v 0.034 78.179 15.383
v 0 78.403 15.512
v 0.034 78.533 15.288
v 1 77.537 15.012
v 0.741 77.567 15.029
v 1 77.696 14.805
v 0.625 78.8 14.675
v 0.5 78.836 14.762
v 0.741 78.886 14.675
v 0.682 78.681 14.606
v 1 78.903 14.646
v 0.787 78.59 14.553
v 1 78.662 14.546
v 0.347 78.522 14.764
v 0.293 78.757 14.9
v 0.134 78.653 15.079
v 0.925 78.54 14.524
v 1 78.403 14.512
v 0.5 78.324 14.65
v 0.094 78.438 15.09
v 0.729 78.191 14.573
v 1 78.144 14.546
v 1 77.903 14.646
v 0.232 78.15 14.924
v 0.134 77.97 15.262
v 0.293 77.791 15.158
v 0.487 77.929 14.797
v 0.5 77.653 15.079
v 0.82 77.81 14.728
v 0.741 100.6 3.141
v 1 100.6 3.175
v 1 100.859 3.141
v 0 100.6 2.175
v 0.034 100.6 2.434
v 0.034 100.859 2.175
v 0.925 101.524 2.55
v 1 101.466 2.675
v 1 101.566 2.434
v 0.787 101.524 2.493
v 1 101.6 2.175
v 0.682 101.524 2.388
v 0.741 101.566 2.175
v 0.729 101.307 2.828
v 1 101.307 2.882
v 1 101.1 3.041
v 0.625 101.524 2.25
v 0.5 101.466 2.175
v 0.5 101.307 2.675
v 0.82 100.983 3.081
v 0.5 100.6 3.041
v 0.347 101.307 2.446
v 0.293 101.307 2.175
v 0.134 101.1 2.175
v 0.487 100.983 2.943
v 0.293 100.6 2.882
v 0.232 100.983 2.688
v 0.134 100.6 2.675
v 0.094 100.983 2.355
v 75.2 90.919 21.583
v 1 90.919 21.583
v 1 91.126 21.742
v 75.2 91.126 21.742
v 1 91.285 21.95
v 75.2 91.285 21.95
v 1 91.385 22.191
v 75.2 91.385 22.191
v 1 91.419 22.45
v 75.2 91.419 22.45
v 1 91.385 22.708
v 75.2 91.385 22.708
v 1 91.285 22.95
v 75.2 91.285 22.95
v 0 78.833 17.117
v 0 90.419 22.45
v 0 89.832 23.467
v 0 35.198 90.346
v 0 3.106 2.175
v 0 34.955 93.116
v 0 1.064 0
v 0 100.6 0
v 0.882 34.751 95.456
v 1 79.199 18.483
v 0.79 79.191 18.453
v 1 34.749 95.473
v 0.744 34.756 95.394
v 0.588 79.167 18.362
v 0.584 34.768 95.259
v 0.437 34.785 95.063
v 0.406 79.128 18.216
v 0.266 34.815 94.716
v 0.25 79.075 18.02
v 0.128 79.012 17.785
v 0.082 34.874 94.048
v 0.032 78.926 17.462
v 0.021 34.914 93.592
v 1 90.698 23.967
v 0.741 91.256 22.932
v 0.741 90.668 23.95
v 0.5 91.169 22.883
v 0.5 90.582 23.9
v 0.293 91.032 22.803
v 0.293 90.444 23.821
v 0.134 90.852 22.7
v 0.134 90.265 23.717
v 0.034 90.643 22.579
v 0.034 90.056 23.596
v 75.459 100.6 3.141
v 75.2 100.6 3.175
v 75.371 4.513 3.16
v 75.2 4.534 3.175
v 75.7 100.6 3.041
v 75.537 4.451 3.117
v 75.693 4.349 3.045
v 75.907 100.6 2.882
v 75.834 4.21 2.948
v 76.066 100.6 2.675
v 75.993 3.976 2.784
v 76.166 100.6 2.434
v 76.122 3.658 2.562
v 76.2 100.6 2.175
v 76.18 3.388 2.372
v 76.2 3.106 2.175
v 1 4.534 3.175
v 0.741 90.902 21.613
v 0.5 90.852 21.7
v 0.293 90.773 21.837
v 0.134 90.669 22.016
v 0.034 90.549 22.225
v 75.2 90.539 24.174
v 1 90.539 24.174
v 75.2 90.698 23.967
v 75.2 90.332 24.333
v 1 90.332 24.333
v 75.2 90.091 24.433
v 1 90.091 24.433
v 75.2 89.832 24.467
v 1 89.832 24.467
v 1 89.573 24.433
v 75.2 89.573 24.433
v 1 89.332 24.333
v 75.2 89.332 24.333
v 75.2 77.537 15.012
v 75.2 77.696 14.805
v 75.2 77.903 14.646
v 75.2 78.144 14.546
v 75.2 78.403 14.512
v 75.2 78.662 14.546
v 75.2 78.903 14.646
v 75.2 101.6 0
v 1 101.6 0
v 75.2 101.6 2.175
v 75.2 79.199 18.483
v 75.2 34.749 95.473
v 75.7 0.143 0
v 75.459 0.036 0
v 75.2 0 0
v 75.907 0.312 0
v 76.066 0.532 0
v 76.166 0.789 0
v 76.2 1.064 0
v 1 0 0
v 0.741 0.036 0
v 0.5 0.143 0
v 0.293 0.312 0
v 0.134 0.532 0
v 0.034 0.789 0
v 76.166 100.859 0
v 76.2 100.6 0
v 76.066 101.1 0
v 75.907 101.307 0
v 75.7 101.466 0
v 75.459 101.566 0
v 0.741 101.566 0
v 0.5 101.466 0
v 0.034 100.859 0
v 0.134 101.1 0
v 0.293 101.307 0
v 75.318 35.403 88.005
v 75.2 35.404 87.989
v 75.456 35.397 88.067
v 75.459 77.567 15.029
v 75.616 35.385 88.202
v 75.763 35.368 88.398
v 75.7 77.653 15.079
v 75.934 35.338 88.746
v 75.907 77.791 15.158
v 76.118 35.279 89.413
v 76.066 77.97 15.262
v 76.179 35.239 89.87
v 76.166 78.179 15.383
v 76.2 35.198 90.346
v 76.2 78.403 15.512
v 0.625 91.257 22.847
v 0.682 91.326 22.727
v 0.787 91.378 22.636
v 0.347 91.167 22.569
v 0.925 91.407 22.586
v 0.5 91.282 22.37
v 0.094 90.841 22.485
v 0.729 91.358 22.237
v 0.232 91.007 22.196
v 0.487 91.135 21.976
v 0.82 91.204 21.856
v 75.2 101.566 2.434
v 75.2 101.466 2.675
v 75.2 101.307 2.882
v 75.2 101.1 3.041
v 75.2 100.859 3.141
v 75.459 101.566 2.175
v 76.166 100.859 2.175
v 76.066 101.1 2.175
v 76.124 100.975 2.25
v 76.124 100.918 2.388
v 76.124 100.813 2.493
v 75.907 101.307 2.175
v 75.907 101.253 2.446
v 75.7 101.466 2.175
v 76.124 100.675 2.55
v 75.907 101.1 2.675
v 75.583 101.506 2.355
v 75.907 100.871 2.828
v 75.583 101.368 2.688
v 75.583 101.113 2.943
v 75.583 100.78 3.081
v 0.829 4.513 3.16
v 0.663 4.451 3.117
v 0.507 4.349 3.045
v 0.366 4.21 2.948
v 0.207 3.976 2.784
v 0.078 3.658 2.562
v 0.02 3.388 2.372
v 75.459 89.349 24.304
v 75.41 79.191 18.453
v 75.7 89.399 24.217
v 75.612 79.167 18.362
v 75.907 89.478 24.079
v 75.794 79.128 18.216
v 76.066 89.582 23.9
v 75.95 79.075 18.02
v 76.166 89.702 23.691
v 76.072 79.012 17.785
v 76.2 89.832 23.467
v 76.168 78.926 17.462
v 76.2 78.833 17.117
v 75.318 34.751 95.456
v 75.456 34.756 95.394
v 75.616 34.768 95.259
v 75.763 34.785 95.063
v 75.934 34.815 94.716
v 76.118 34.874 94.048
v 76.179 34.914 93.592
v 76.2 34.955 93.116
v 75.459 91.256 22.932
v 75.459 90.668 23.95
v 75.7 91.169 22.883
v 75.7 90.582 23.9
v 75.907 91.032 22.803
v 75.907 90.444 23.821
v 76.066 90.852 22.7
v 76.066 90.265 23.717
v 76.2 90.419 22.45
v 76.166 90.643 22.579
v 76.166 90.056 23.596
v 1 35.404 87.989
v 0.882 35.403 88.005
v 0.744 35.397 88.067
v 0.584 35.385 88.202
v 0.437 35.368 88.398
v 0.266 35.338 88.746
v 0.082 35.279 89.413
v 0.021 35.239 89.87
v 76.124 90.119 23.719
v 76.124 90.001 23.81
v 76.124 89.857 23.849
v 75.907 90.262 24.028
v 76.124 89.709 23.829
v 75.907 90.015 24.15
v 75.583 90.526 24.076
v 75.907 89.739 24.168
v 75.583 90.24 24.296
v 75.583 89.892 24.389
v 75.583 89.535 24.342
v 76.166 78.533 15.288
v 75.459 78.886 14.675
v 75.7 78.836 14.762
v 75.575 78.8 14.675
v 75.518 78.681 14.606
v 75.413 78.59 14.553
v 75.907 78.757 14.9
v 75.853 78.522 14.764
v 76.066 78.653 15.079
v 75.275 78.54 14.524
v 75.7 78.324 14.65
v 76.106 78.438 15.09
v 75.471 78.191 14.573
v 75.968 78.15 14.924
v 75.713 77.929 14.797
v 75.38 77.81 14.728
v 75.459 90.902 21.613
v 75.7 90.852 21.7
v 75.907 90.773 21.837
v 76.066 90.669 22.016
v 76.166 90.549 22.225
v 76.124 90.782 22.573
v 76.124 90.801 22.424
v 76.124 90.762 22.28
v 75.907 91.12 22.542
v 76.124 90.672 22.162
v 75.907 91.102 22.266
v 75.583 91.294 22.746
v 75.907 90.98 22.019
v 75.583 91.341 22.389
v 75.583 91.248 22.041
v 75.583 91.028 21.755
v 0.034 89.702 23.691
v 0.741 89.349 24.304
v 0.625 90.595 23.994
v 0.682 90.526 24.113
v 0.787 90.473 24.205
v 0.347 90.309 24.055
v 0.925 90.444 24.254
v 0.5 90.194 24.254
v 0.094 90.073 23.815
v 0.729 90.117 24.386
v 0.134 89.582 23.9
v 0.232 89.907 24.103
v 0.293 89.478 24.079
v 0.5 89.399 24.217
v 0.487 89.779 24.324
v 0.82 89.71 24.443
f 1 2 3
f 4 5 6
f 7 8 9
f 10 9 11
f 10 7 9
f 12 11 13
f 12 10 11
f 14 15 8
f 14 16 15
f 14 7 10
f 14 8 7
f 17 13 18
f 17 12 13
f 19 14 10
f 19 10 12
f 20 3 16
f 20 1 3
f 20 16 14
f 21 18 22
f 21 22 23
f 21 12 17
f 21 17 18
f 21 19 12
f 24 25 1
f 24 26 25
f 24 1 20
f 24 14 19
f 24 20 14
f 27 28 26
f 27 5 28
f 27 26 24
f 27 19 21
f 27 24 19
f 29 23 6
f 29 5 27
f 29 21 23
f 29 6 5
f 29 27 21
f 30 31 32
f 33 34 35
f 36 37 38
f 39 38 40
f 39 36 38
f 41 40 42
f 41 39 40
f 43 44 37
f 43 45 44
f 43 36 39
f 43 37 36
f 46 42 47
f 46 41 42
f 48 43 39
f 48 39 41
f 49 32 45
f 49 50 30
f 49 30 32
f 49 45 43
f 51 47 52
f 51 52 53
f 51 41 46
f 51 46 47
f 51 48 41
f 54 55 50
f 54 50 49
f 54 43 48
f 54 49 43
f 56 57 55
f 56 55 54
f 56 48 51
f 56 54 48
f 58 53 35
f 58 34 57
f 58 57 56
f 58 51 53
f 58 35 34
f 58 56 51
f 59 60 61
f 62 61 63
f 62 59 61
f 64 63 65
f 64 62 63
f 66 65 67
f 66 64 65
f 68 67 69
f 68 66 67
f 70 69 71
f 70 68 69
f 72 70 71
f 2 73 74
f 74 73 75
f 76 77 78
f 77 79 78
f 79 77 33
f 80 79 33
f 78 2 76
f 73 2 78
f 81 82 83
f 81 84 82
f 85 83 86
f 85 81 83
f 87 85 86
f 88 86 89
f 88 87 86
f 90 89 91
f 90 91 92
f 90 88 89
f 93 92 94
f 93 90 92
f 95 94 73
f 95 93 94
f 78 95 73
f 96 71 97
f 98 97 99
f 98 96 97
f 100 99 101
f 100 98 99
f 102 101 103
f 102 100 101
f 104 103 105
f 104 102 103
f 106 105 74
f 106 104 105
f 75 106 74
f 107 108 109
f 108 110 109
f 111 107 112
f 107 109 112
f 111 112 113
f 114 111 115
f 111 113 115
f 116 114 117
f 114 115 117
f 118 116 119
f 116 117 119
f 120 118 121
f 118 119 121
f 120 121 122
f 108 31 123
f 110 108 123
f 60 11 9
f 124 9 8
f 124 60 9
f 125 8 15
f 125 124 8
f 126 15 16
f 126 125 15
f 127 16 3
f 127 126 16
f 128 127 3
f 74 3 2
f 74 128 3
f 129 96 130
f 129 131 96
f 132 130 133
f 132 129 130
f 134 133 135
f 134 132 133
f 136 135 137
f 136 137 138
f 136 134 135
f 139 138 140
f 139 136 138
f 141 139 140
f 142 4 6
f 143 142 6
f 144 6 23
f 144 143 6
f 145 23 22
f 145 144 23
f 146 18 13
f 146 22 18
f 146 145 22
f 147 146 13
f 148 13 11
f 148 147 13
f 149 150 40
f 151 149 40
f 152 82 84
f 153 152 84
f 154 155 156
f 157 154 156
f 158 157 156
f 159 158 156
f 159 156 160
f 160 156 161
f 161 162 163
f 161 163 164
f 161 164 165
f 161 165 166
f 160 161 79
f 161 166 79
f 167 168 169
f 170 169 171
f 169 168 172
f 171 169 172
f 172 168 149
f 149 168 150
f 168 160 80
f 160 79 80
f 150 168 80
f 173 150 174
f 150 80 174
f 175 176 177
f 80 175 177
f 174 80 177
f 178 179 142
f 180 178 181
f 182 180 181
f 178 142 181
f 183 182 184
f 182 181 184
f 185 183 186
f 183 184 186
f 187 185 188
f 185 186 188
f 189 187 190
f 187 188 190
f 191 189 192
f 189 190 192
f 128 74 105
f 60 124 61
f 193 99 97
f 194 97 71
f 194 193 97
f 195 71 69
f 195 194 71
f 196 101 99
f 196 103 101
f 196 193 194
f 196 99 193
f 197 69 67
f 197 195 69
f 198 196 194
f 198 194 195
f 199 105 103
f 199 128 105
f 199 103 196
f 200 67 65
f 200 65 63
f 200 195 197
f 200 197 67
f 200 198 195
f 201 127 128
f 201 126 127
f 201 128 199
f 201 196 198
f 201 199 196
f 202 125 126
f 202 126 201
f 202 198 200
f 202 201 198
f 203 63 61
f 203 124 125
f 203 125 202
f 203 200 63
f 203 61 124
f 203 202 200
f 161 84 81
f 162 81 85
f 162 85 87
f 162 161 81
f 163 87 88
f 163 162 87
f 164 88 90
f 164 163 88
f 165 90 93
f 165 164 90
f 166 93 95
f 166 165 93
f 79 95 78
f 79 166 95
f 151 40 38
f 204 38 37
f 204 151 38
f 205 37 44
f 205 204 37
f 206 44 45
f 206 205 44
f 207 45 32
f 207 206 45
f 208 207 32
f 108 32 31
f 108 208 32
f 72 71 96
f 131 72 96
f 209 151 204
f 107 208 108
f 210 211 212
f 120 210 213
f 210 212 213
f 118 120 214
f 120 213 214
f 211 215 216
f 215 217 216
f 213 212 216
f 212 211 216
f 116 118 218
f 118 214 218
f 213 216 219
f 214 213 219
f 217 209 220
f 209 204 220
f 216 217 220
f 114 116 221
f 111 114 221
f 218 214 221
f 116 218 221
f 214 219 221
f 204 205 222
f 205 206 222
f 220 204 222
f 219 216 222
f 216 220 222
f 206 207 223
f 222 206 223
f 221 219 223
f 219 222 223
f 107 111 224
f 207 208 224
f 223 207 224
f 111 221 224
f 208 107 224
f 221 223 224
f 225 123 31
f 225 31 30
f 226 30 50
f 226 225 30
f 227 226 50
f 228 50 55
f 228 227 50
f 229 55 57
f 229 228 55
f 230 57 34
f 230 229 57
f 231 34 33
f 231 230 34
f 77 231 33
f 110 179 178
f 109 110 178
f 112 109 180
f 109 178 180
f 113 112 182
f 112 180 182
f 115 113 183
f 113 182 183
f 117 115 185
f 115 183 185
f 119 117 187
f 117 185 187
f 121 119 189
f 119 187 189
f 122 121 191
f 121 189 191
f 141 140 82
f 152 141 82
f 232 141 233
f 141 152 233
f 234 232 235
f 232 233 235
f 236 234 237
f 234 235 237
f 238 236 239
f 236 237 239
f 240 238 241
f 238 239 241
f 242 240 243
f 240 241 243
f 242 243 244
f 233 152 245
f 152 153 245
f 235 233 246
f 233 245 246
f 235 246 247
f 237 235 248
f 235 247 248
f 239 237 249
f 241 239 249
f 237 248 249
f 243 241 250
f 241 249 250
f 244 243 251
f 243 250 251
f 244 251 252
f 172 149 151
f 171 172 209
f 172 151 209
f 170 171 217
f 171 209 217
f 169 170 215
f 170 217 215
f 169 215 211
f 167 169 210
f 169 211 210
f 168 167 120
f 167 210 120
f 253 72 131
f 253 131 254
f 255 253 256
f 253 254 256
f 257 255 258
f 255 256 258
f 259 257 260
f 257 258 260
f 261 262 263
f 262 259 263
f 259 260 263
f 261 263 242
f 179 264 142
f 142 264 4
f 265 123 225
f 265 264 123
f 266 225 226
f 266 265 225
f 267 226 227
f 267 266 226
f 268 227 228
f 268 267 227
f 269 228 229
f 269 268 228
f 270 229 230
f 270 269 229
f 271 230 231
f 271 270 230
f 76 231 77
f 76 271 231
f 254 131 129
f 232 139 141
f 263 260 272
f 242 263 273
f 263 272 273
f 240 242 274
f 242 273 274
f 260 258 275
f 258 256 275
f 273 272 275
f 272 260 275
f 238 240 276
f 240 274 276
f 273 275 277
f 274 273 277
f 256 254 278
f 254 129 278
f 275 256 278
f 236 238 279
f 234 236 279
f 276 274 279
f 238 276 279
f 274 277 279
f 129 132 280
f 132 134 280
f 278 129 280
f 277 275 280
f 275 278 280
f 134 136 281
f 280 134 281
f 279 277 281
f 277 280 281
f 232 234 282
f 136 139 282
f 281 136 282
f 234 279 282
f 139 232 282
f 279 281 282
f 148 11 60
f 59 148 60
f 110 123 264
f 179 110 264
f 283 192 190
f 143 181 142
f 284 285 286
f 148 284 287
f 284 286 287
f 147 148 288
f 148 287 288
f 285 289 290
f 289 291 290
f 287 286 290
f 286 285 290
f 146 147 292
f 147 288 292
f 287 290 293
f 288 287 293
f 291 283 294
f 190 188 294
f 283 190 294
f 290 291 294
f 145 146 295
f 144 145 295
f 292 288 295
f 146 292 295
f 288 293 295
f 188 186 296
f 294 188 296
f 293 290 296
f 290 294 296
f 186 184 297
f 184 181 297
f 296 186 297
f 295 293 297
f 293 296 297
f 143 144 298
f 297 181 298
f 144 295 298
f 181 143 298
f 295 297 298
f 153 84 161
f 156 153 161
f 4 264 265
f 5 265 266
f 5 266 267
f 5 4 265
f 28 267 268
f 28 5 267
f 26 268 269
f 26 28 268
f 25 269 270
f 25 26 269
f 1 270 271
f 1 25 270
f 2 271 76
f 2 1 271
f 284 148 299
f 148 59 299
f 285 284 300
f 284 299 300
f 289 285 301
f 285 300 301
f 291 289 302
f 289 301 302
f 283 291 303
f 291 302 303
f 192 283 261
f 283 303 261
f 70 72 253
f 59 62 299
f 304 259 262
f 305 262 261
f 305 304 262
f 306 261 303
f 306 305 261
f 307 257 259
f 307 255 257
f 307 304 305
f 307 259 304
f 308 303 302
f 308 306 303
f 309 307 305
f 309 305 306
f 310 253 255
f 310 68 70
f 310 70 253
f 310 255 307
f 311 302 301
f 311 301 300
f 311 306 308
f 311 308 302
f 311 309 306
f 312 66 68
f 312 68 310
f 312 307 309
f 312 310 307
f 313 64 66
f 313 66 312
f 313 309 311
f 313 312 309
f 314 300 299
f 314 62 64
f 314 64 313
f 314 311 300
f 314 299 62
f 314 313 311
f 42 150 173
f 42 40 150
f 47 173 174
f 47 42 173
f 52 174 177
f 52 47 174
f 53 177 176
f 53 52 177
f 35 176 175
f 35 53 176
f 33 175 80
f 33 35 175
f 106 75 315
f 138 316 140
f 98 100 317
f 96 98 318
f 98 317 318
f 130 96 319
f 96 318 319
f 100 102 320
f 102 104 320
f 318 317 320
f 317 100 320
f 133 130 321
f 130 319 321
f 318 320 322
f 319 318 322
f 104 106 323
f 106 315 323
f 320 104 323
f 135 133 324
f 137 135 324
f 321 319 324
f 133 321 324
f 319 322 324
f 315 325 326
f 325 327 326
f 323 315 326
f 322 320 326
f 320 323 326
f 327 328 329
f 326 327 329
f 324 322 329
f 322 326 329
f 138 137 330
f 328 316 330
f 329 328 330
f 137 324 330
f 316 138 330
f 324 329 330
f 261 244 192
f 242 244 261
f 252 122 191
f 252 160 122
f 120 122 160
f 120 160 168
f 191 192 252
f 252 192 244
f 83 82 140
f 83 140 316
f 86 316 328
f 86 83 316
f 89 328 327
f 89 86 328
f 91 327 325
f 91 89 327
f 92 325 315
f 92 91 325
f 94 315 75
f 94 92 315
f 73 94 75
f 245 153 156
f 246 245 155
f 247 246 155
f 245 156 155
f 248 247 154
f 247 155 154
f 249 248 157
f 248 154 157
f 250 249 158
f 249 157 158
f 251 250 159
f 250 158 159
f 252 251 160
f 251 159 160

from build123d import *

# Parameters (mm, degrees)
PAD_DEPTH = 76.2
FILLET_R  = 0.999998


with BuildPart() as part:
    # Sketch → Pad (new body)
    with BuildSketch(Plane.YZ):
        Polygon((0, 0), (101.6, 0), (101.6, 3.175), (4.53437, 3.175), (35.404021, 87.988668), (78.037116, 14.145981), (91.785269, 22.083481), (90.197769, 24.833112), (79.199247, 18.483112), (34.749247, 95.47277), align=None)
    extrude(amount=PAD_DEPTH)

    # Fillet
    fillet_edges = [part.edges().sort_by_distance(p)[0] for p in [
        (0, 53.067185, 3.175),
        (38.1, 101.6, 3.175),
        (76.2, 101.6, 1.5875),
        (0, 101.6, 1.5875),
        (0, 19.969195, 45.581834),
        (76.2, 19.969195, 45.581834),
        (0, 17.374623, 47.736385),
        (0, 56.720568, 51.067325),
        (0, 56.974247, 56.977941),
        (0, 84.698508, 21.658112),
        (0, 84.911193, 18.114731),
        (0, 90.991519, 23.458297),
        (38.1, 90.197769, 24.833112),
        (38.1, 91.785269, 22.083481),
        (76.2, 90.991519, 23.458297),
        (76.2, 53.067185, 3.175),
        (76.2, 17.374623, 47.736385),
        (76.2, 56.720568, 51.067325),
        (76.2, 56.974247, 56.977941),
        (76.2, 84.698508, 21.658112),
        (76.2, 84.911193, 18.114731),
        (38.1, 78.037116, 14.145981),
    ]]
    fillet(fillet_edges, radius=FILLET_R)


solid = part.part
